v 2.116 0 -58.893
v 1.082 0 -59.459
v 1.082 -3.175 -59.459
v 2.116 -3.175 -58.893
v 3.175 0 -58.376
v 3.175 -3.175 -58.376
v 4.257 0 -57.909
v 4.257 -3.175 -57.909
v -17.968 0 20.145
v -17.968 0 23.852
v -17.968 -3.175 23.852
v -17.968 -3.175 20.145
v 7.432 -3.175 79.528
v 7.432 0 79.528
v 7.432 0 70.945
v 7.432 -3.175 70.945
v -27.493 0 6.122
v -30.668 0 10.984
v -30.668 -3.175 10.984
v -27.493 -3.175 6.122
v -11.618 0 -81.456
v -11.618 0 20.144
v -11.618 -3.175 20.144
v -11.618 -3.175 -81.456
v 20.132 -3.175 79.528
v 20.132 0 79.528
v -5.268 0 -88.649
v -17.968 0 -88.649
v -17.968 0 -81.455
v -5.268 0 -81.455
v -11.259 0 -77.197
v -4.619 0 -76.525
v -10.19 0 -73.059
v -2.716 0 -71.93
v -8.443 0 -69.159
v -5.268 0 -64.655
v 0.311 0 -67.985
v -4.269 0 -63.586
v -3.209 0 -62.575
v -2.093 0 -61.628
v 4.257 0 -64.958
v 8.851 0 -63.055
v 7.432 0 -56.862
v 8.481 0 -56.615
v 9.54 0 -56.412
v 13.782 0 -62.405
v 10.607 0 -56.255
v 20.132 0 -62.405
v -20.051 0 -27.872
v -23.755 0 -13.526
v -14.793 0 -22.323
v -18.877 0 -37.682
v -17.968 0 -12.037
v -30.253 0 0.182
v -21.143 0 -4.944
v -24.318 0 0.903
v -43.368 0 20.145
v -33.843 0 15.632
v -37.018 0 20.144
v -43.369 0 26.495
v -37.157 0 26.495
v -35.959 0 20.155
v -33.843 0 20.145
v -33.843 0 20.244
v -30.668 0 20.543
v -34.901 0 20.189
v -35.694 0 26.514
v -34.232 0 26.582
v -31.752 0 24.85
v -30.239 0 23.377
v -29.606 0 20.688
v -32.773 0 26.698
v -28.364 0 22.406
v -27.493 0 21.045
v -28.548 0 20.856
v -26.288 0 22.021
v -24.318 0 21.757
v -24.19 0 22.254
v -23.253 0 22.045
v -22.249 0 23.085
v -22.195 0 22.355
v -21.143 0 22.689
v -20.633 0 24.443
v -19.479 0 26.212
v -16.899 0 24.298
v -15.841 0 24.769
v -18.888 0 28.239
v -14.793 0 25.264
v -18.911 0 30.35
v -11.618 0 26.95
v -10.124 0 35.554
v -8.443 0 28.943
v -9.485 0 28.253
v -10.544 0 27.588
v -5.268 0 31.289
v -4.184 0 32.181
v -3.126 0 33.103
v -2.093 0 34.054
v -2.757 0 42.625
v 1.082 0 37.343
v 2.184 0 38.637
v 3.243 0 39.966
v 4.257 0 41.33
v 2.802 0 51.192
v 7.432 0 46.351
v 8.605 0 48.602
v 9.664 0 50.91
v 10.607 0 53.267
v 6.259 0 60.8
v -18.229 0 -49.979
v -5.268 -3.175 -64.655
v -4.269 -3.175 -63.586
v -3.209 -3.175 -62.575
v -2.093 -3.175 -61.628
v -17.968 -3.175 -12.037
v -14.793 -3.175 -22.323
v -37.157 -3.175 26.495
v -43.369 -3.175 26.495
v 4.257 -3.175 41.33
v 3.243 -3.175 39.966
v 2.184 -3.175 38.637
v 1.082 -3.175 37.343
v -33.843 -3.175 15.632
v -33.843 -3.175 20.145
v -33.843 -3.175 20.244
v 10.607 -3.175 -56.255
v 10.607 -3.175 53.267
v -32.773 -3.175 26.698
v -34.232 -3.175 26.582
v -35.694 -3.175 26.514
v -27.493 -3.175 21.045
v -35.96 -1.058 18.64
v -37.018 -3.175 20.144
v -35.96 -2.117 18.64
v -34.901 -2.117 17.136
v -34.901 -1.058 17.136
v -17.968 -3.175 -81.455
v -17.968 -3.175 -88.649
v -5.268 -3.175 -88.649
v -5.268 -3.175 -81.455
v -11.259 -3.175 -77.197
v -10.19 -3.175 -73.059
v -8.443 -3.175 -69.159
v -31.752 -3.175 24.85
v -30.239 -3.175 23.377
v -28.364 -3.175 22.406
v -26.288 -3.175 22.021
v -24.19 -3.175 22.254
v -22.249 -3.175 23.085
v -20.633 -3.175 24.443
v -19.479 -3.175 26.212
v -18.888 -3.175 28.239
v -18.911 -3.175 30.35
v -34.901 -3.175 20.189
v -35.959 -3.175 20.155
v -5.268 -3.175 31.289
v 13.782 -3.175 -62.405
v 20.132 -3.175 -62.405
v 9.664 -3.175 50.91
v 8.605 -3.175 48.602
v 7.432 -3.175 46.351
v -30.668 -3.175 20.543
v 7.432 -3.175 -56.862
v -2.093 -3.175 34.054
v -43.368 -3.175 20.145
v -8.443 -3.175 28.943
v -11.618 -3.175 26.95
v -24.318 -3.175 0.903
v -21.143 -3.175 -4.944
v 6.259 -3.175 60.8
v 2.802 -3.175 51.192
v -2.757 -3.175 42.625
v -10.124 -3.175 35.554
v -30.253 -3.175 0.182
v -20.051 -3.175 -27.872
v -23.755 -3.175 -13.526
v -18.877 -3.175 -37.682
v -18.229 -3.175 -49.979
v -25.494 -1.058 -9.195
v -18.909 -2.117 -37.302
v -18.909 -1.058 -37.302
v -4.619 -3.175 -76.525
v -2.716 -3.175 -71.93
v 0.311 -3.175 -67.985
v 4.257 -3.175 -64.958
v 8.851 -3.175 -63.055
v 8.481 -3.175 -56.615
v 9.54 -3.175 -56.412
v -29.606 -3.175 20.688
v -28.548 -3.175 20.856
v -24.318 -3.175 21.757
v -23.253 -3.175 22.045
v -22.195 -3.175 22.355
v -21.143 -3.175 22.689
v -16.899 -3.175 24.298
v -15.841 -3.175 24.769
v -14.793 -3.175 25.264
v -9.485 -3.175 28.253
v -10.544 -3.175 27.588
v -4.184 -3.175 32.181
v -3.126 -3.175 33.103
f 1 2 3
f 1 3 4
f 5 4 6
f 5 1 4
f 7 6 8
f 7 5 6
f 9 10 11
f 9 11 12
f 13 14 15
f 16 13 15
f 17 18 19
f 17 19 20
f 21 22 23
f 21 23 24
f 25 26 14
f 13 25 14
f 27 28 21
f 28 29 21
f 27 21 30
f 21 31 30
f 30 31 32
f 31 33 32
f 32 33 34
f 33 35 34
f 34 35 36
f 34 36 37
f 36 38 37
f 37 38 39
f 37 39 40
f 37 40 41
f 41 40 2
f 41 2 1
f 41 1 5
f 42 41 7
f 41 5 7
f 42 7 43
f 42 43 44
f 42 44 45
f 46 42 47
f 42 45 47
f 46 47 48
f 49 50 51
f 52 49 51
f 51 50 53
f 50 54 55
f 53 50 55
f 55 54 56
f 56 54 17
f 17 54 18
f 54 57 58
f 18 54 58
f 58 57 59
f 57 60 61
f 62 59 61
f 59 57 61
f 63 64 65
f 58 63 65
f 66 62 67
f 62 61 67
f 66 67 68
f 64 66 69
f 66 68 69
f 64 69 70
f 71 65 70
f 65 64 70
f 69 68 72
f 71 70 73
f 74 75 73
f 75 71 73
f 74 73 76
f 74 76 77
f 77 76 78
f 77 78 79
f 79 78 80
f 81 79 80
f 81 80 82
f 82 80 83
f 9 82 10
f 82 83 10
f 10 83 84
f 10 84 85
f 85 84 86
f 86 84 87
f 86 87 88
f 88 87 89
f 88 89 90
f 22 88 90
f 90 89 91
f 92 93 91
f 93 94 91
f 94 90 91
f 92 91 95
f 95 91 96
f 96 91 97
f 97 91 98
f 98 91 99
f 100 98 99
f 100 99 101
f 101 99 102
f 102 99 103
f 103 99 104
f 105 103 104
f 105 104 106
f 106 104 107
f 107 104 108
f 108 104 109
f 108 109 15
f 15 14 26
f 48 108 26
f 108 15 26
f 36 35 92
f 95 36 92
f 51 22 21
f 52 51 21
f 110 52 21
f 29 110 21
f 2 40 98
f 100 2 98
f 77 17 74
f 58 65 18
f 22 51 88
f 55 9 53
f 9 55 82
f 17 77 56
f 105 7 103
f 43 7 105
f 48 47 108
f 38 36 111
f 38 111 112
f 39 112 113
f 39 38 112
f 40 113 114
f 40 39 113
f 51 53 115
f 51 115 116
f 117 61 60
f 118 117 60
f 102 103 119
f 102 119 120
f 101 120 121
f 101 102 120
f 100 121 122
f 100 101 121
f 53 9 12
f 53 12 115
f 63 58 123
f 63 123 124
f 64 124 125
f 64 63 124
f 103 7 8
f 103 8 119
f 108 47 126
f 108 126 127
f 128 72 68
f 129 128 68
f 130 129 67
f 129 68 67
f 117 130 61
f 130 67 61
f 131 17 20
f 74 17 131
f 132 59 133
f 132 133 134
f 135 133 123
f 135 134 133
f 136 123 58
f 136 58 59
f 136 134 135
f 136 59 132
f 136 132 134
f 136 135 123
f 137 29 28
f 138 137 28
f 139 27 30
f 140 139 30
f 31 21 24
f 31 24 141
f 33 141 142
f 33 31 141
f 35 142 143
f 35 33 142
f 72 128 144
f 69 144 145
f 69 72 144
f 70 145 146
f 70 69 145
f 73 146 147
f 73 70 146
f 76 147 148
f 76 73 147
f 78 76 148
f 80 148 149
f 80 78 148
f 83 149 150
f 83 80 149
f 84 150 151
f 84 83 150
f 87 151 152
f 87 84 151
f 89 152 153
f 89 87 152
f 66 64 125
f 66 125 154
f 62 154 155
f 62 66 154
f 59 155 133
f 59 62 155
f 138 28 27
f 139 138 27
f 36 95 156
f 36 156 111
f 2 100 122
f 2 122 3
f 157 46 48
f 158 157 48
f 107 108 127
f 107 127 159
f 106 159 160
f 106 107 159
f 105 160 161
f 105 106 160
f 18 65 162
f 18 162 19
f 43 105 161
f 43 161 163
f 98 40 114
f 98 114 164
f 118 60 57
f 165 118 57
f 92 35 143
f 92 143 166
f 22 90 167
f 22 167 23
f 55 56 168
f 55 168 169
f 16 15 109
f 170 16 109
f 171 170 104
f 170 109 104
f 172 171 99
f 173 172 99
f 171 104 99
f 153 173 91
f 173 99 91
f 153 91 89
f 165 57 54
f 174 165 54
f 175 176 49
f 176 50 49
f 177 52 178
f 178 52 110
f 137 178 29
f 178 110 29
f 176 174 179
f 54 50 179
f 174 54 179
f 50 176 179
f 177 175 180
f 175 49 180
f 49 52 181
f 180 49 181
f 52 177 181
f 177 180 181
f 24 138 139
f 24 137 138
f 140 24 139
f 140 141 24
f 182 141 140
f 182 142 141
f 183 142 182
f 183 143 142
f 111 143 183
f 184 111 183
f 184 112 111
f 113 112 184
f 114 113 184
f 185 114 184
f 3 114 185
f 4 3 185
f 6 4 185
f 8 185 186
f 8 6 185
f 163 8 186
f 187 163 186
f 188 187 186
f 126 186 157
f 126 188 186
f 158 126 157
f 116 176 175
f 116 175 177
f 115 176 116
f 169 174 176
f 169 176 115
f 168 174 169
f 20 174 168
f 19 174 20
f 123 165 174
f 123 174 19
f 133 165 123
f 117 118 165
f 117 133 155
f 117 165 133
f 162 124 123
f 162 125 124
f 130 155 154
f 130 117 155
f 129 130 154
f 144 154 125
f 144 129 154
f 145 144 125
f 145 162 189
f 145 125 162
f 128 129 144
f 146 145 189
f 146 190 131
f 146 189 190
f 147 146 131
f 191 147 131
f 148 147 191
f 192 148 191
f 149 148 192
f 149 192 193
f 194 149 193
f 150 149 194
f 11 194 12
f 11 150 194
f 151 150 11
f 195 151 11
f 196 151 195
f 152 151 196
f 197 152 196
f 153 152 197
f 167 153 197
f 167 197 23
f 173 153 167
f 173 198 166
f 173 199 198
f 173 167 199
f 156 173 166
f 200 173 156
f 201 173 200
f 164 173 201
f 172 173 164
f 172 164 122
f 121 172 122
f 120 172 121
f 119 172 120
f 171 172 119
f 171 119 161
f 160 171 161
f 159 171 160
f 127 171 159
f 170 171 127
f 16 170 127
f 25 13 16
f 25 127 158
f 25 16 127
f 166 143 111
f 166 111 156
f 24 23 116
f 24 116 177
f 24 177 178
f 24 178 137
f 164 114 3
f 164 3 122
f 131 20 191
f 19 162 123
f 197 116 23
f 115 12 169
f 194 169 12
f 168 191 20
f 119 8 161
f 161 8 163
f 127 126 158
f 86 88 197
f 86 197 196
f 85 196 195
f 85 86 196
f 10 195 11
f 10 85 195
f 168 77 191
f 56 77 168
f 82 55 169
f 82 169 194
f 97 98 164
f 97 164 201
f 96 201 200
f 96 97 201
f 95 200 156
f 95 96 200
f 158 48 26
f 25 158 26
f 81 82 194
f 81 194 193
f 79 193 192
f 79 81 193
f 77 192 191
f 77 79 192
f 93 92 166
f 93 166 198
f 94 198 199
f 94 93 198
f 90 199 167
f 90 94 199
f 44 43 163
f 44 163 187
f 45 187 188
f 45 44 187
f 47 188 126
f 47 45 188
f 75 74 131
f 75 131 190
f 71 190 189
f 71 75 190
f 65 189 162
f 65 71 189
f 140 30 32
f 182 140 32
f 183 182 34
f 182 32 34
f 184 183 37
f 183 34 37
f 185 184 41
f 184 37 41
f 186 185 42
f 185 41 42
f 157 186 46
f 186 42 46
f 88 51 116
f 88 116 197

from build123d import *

# Parameters (mm, degrees)
F2_DEPTH = 3.175
F3_DEPTH = 3.175
F4_R     = 7.203715
F5_DEPTH = 25.4


with BuildPart() as f2:
    # F1 (on Front) → F2 (new body)
    with BuildSketch(Plane.XZ):
        with BuildLine():
            Line((-5.268215, -88.649482), (-5.268215, -81.455395))
            ThreePointArc((-5.268215, -81.455395), (0.311401, -67.985011), (13.781785, -62.405395))
            Line((13.781785, -62.405395), (20.131785, -62.405395))
            Line((20.131785, -62.405395), (20.131785, 79.52777))
            Line((20.131785, 79.52777), (7.431785, 79.52777))
            Line((7.431785, 79.52777), (7.431785, 70.944605))
            ThreePointArc((7.431785, 70.944605), (-5.63649, 39.464613), (-37.157186, 26.494822))
            Line((-37.157186, 26.494822), (-43.368766, 26.494822))
            Line((-43.368766, 26.494822), (-43.368215, 20.144822))
            add(Edge.make_bspline(
                [(-43.368215, 20.144822), (-17.968215, -15.569895), (-17.968215, -23.519904), (-17.968215, -81.455395)],
                knots=[0, 0, 0, 0, 104.727094, 104.727094, 104.727094, 104.727094], degree=3))
            Line((-17.968215, -81.455395), (-17.968215, -88.649482))
            Line((-17.968215, -88.649482), (-11.618215, -88.649482))
            Line((-11.618215, -88.649482), (-5.268215, -88.649482))
        make_face()
    extrude(amount=F2_DEPTH)

    # F0 (on Front) → F3 (cut)
    with BuildSketch(Plane.XZ):
        with BuildLine():
            Line((10.60685, -56.254837), (10.60685, 20.144395))
            Line((10.60685, 20.144395), (10.60685, 53.26673))
            ThreePointArc((10.60685, 53.26673), (9.14903, 49.749299), (7.43185, 46.350937))
            Line((7.43185, 46.350937), (7.43185, 20.144409))
            Line((7.43185, 20.144409), (7.43185, -56.862174))
            ThreePointArc((7.43185, -56.862174), (9.009679, -56.507945), (10.60685, -56.254837))
        make_face()
        with BuildLine():
            Line((4.25685, -57.909188), (4.25685, 20.144423))
            Line((4.25685, 20.144423), (4.25685, 41.329953))
            ThreePointArc((4.25685, 41.329953), (2.719376, 39.296806), (1.08185, 37.34334))
            Line((1.08185, 37.34334), (1.08185, 20.144436))
            Line((1.08185, 20.144436), (1.08185, -59.458573))
            ThreePointArc((1.08185, -59.458573), (2.64238, -58.628612), (4.25685, -57.909188))
        make_face()
        with BuildLine():
            Line((-2.09315, -61.62775), (-2.09315, 20.14445))
            Line((-2.09315, 20.14445), (-2.09315, 34.054215))
            ThreePointArc((-2.09315, 34.054215), (-3.651984, 32.638521), (-5.26815, 31.288645))
            Line((-5.26815, 31.288645), (-5.26815, 20.144463))
            Line((-5.26815, 20.144463), (-5.26815, -64.655097))
            ThreePointArc((-5.26815, -64.655097), (-3.74613, -63.072749), (-2.09315, -61.62775))
        make_face()
        with BuildLine():
            Line((-8.44315, -69.158896), (-8.44315, 20.144477))
            Line((-8.44315, 20.144477), (-8.44315, 28.94308))
            ThreePointArc((-8.44315, 28.94308), (-10.012262, 27.91739), (-11.61815, 26.950291))
            Line((-11.61815, 26.950291), (-11.61815, 20.14449))
            Line((-11.61815, 20.14449), (-11.618149, -81.455618))
            ThreePointArc((-11.618149, -81.455618), (-10.811594, -75.105618), (-8.44315, -69.158896))
        make_face()
        with BuildLine():
            Line((-14.79315, -22.322719), (-14.79315, 20.144504))
            Line((-14.79315, 20.144504), (-14.79315, 25.264087))
            ThreePointArc((-14.79315, 25.264087), (-16.368567, 24.530647), (-17.96815, 23.851521))
            Line((-17.96815, 23.851521), (-17.96815, 20.144518))
            Line((-17.96815, 20.144518), (-17.968287, -12.036756))
            Line((-17.968287, -12.036756), (-14.79315, -22.322719))
        make_face()
        with BuildLine():
            Line((-21.14315, -4.943635), (-21.14315, 20.144531))
            Line((-21.14315, 20.144531), (-21.14315, 22.68856))
            ThreePointArc((-21.14315, 22.68856), (-22.723067, 22.19717), (-24.31815, 21.757493))
            Line((-24.31815, 21.757493), (-24.31815, 20.144545))
            Line((-24.31815, 20.144545), (-24.31815, 0.903125))
            Line((-24.31815, 0.903125), (-21.14315, -4.943635))
        make_face()
        with BuildLine():
            Line((-27.49315, 6.121868), (-27.49315, 20.144558))
            Line((-27.49315, 20.144558), (-27.49315, 21.04534))
            ThreePointArc((-27.49315, 21.04534), (-29.076674, 20.76896), (-30.66815, 20.542819))
            Line((-30.66815, 20.542819), (-30.66815, 20.144572))
            Line((-30.66815, 20.144572), (-30.66815, 10.984366))
            Line((-30.66815, 10.984366), (-27.49315, 6.121868))
        make_face()
        with BuildLine():
            Line((-33.84315, 15.63159), (-33.84315, 20.144585))
            add(Edge.make_bspline(
                [(-33.84315, 20.243698), (-33.84315, 20.21066), (-33.84315, 20.177623), (-33.84315, 20.144585)],
                knots=[0, 0, 0, 0, 0.099112, 0.099112, 0.099112, 0.099112], degree=3))
            ThreePointArc((-33.84315, 20.243698), (-35.429797, 20.169219), (-37.017997, 20.144382))
            add(Edge.make_bspline(
                [(-37.017997, 20.144382), (-35.959714, 18.640118), (-34.901432, 17.135854), (-33.84315, 15.63159)],
                knots=[0.000266, 0.000266, 0.000266, 0.000266, 5.51796, 5.51796, 5.51796, 5.51796], degree=3))
        make_face()
    extrude(amount=F3_DEPTH, mode=Mode.SUBTRACT)

    # F4 (on Front) → F5 (cut)
    with BuildSketch(Plane.XZ):
        with Locations((-26.025116, 29.219549)):
            Circle(F4_R)
    extrude(amount=F5_DEPTH, mode=Mode.SUBTRACT)


solid = f2.part
